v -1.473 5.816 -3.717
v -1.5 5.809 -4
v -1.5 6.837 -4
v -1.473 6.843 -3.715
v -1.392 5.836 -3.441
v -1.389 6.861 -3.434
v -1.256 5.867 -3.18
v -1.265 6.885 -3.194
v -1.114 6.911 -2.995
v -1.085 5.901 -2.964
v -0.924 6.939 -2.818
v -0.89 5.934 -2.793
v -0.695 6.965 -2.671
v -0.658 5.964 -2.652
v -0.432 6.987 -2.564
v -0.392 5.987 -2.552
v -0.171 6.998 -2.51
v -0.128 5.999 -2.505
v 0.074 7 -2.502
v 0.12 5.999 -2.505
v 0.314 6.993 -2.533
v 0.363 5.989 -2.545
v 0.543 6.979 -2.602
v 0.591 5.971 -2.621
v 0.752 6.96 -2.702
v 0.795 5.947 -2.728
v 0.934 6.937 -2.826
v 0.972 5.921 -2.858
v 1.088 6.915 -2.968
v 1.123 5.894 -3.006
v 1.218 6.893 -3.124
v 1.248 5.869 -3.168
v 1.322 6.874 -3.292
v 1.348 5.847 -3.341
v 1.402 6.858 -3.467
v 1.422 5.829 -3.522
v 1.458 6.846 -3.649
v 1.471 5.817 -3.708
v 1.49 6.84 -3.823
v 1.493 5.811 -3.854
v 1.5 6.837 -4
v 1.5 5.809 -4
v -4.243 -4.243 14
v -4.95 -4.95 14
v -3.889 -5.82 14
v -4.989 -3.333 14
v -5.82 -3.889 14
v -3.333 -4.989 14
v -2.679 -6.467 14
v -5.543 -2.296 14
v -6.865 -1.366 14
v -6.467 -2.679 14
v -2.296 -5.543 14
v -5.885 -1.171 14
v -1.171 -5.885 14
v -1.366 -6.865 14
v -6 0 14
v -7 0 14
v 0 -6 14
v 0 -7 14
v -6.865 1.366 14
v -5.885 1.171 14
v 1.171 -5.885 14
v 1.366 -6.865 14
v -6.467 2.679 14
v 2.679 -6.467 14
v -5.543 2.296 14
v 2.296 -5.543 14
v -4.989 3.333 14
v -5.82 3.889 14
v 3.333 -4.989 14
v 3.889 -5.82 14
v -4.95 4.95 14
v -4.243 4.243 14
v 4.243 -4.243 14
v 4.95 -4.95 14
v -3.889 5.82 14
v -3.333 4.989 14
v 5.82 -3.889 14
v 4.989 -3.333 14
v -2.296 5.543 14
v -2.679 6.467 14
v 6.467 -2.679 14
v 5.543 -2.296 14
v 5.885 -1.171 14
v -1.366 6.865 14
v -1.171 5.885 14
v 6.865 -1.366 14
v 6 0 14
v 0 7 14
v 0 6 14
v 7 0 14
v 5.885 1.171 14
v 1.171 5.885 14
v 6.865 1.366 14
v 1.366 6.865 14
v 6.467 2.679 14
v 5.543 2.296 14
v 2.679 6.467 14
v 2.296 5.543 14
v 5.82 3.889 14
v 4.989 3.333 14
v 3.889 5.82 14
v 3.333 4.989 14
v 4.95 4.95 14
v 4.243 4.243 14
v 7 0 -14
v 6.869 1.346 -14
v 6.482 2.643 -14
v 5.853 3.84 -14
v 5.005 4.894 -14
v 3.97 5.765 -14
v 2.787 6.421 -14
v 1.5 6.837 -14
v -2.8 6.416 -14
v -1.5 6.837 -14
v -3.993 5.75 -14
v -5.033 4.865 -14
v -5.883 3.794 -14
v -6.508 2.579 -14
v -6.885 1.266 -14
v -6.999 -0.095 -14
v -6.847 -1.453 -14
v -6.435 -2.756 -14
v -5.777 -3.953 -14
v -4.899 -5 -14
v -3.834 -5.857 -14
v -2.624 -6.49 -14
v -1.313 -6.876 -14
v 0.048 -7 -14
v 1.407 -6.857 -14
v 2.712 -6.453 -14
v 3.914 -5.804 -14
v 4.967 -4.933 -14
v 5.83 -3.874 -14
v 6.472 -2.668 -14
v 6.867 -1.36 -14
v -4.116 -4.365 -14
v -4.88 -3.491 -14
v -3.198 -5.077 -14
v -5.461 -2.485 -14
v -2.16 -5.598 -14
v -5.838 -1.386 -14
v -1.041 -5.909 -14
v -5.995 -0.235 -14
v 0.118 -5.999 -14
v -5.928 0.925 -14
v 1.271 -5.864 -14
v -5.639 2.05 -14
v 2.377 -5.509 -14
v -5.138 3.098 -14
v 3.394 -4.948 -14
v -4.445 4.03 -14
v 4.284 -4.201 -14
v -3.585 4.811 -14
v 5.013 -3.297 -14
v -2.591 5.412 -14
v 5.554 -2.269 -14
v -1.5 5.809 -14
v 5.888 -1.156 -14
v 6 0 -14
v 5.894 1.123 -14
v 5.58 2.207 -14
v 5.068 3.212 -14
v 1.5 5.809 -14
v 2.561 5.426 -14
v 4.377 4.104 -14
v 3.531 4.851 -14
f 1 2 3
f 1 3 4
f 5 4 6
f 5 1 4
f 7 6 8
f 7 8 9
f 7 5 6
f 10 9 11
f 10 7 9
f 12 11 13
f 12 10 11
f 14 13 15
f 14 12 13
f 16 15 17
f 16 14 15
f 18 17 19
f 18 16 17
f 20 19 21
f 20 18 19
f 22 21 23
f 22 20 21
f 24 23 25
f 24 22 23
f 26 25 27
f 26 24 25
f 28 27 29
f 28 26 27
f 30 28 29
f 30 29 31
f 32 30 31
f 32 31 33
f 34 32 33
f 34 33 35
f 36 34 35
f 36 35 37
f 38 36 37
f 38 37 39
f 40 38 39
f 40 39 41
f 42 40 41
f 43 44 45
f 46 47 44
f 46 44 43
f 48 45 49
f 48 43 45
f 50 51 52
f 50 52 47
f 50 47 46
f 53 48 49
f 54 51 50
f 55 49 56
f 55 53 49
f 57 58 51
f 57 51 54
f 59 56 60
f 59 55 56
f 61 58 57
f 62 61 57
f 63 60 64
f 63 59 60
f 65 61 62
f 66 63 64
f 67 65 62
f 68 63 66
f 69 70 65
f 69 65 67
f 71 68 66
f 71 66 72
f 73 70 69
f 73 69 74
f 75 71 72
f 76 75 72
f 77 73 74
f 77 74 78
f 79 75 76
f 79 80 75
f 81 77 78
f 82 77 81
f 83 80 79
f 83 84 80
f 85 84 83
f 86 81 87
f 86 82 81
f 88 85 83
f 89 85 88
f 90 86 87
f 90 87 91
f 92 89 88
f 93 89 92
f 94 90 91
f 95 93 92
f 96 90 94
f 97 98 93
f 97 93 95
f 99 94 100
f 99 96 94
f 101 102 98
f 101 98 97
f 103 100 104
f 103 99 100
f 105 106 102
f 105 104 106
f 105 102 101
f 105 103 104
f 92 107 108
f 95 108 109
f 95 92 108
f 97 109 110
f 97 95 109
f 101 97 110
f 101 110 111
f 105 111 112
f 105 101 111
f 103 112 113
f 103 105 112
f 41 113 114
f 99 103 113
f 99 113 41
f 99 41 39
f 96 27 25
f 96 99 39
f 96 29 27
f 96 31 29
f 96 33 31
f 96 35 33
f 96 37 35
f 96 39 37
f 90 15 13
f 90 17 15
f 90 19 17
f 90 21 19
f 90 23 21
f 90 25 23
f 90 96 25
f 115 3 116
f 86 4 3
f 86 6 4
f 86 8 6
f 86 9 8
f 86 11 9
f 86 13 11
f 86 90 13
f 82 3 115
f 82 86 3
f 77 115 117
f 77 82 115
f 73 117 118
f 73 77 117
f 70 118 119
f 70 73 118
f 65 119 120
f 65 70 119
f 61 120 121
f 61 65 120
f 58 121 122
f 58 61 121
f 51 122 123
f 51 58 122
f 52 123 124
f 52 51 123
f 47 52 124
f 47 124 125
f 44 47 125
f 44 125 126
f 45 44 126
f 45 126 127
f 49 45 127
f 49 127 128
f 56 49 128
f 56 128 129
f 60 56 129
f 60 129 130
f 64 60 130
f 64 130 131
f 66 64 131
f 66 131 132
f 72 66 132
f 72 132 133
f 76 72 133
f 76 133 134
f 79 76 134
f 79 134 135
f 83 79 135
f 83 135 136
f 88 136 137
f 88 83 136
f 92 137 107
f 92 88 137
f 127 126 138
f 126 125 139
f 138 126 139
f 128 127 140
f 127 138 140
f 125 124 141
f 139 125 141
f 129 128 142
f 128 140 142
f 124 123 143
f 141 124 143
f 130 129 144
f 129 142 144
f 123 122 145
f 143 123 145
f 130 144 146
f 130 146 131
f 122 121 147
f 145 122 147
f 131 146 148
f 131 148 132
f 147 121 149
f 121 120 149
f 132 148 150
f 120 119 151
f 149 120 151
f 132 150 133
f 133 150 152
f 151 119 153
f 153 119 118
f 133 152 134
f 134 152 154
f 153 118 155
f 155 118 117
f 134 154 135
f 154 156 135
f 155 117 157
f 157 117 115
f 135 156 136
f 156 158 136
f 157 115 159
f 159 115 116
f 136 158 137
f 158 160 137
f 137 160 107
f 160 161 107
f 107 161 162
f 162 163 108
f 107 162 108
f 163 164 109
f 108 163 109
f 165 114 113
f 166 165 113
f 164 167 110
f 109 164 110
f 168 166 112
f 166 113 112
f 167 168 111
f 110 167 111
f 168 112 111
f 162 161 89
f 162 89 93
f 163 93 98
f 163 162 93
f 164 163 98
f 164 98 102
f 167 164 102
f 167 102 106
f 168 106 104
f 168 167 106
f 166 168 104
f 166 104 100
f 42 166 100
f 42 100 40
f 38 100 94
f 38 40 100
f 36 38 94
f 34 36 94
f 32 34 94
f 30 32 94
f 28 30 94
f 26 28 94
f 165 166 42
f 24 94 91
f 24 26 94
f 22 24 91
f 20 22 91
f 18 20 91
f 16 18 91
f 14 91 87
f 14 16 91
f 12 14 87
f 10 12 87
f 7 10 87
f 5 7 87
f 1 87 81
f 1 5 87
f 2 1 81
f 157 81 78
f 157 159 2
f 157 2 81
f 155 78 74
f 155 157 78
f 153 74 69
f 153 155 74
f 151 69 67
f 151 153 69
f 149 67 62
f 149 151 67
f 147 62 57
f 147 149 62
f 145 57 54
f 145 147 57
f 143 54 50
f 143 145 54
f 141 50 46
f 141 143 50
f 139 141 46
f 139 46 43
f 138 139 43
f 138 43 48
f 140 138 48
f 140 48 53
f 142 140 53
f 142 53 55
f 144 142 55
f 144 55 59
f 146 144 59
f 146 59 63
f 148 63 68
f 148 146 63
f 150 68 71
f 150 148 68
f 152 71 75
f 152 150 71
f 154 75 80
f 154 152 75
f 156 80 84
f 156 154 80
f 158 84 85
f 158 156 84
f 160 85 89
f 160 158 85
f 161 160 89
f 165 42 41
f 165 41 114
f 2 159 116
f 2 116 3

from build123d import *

# Parameters (mm, degrees)
ESQUISSE1_R             = 7
ESQUISSE1_R_2           = 6
BOSS_EXTRU_1_DEPTH      = 14
ENL_V_MAT_EXTRU_1_DEPTH = 18.146428199


with BuildPart() as part:
    # Esquisse1 → Boss.-Extru.1 (new, symmetric)
    with BuildSketch(Plane.XY):
        Circle(ESQUISSE1_R)
        Circle(ESQUISSE1_R_2, mode=Mode.SUBTRACT)
    extrude(amount=BOSS_EXTRU_1_DEPTH, both=True)

    # Esquisse2 → Enlèv. mat.-Extru.1 (cut, through all)
    with BuildSketch(Plane(origin=(0, 0, 0), x_dir=(1, 0, 0), z_dir=(0, 1, 0))):
        with BuildLine():
            Line((-1.5, 82.523499554), (-1.5, 14))
            Line((-1.5, 14), (-1.5, 4))
            ThreePointArc((-1.5, 4), (0, 2.5), (1.5, 4))
            Line((1.5, 4), (1.5, 14))
            Line((1.5, 14), (1.5, 82.523499554))
            Line((1.5, 82.523499554), (1.5, 219.570498661))
            Line((1.5, 219.570498661), (-1.5, 219.570498661))
            Line((-1.5, 219.570498661), (-1.5, 82.523499554))
        make_face()
    extrude(amount=ENL_V_MAT_EXTRU_1_DEPTH, mode=Mode.SUBTRACT)


solid = part.part
